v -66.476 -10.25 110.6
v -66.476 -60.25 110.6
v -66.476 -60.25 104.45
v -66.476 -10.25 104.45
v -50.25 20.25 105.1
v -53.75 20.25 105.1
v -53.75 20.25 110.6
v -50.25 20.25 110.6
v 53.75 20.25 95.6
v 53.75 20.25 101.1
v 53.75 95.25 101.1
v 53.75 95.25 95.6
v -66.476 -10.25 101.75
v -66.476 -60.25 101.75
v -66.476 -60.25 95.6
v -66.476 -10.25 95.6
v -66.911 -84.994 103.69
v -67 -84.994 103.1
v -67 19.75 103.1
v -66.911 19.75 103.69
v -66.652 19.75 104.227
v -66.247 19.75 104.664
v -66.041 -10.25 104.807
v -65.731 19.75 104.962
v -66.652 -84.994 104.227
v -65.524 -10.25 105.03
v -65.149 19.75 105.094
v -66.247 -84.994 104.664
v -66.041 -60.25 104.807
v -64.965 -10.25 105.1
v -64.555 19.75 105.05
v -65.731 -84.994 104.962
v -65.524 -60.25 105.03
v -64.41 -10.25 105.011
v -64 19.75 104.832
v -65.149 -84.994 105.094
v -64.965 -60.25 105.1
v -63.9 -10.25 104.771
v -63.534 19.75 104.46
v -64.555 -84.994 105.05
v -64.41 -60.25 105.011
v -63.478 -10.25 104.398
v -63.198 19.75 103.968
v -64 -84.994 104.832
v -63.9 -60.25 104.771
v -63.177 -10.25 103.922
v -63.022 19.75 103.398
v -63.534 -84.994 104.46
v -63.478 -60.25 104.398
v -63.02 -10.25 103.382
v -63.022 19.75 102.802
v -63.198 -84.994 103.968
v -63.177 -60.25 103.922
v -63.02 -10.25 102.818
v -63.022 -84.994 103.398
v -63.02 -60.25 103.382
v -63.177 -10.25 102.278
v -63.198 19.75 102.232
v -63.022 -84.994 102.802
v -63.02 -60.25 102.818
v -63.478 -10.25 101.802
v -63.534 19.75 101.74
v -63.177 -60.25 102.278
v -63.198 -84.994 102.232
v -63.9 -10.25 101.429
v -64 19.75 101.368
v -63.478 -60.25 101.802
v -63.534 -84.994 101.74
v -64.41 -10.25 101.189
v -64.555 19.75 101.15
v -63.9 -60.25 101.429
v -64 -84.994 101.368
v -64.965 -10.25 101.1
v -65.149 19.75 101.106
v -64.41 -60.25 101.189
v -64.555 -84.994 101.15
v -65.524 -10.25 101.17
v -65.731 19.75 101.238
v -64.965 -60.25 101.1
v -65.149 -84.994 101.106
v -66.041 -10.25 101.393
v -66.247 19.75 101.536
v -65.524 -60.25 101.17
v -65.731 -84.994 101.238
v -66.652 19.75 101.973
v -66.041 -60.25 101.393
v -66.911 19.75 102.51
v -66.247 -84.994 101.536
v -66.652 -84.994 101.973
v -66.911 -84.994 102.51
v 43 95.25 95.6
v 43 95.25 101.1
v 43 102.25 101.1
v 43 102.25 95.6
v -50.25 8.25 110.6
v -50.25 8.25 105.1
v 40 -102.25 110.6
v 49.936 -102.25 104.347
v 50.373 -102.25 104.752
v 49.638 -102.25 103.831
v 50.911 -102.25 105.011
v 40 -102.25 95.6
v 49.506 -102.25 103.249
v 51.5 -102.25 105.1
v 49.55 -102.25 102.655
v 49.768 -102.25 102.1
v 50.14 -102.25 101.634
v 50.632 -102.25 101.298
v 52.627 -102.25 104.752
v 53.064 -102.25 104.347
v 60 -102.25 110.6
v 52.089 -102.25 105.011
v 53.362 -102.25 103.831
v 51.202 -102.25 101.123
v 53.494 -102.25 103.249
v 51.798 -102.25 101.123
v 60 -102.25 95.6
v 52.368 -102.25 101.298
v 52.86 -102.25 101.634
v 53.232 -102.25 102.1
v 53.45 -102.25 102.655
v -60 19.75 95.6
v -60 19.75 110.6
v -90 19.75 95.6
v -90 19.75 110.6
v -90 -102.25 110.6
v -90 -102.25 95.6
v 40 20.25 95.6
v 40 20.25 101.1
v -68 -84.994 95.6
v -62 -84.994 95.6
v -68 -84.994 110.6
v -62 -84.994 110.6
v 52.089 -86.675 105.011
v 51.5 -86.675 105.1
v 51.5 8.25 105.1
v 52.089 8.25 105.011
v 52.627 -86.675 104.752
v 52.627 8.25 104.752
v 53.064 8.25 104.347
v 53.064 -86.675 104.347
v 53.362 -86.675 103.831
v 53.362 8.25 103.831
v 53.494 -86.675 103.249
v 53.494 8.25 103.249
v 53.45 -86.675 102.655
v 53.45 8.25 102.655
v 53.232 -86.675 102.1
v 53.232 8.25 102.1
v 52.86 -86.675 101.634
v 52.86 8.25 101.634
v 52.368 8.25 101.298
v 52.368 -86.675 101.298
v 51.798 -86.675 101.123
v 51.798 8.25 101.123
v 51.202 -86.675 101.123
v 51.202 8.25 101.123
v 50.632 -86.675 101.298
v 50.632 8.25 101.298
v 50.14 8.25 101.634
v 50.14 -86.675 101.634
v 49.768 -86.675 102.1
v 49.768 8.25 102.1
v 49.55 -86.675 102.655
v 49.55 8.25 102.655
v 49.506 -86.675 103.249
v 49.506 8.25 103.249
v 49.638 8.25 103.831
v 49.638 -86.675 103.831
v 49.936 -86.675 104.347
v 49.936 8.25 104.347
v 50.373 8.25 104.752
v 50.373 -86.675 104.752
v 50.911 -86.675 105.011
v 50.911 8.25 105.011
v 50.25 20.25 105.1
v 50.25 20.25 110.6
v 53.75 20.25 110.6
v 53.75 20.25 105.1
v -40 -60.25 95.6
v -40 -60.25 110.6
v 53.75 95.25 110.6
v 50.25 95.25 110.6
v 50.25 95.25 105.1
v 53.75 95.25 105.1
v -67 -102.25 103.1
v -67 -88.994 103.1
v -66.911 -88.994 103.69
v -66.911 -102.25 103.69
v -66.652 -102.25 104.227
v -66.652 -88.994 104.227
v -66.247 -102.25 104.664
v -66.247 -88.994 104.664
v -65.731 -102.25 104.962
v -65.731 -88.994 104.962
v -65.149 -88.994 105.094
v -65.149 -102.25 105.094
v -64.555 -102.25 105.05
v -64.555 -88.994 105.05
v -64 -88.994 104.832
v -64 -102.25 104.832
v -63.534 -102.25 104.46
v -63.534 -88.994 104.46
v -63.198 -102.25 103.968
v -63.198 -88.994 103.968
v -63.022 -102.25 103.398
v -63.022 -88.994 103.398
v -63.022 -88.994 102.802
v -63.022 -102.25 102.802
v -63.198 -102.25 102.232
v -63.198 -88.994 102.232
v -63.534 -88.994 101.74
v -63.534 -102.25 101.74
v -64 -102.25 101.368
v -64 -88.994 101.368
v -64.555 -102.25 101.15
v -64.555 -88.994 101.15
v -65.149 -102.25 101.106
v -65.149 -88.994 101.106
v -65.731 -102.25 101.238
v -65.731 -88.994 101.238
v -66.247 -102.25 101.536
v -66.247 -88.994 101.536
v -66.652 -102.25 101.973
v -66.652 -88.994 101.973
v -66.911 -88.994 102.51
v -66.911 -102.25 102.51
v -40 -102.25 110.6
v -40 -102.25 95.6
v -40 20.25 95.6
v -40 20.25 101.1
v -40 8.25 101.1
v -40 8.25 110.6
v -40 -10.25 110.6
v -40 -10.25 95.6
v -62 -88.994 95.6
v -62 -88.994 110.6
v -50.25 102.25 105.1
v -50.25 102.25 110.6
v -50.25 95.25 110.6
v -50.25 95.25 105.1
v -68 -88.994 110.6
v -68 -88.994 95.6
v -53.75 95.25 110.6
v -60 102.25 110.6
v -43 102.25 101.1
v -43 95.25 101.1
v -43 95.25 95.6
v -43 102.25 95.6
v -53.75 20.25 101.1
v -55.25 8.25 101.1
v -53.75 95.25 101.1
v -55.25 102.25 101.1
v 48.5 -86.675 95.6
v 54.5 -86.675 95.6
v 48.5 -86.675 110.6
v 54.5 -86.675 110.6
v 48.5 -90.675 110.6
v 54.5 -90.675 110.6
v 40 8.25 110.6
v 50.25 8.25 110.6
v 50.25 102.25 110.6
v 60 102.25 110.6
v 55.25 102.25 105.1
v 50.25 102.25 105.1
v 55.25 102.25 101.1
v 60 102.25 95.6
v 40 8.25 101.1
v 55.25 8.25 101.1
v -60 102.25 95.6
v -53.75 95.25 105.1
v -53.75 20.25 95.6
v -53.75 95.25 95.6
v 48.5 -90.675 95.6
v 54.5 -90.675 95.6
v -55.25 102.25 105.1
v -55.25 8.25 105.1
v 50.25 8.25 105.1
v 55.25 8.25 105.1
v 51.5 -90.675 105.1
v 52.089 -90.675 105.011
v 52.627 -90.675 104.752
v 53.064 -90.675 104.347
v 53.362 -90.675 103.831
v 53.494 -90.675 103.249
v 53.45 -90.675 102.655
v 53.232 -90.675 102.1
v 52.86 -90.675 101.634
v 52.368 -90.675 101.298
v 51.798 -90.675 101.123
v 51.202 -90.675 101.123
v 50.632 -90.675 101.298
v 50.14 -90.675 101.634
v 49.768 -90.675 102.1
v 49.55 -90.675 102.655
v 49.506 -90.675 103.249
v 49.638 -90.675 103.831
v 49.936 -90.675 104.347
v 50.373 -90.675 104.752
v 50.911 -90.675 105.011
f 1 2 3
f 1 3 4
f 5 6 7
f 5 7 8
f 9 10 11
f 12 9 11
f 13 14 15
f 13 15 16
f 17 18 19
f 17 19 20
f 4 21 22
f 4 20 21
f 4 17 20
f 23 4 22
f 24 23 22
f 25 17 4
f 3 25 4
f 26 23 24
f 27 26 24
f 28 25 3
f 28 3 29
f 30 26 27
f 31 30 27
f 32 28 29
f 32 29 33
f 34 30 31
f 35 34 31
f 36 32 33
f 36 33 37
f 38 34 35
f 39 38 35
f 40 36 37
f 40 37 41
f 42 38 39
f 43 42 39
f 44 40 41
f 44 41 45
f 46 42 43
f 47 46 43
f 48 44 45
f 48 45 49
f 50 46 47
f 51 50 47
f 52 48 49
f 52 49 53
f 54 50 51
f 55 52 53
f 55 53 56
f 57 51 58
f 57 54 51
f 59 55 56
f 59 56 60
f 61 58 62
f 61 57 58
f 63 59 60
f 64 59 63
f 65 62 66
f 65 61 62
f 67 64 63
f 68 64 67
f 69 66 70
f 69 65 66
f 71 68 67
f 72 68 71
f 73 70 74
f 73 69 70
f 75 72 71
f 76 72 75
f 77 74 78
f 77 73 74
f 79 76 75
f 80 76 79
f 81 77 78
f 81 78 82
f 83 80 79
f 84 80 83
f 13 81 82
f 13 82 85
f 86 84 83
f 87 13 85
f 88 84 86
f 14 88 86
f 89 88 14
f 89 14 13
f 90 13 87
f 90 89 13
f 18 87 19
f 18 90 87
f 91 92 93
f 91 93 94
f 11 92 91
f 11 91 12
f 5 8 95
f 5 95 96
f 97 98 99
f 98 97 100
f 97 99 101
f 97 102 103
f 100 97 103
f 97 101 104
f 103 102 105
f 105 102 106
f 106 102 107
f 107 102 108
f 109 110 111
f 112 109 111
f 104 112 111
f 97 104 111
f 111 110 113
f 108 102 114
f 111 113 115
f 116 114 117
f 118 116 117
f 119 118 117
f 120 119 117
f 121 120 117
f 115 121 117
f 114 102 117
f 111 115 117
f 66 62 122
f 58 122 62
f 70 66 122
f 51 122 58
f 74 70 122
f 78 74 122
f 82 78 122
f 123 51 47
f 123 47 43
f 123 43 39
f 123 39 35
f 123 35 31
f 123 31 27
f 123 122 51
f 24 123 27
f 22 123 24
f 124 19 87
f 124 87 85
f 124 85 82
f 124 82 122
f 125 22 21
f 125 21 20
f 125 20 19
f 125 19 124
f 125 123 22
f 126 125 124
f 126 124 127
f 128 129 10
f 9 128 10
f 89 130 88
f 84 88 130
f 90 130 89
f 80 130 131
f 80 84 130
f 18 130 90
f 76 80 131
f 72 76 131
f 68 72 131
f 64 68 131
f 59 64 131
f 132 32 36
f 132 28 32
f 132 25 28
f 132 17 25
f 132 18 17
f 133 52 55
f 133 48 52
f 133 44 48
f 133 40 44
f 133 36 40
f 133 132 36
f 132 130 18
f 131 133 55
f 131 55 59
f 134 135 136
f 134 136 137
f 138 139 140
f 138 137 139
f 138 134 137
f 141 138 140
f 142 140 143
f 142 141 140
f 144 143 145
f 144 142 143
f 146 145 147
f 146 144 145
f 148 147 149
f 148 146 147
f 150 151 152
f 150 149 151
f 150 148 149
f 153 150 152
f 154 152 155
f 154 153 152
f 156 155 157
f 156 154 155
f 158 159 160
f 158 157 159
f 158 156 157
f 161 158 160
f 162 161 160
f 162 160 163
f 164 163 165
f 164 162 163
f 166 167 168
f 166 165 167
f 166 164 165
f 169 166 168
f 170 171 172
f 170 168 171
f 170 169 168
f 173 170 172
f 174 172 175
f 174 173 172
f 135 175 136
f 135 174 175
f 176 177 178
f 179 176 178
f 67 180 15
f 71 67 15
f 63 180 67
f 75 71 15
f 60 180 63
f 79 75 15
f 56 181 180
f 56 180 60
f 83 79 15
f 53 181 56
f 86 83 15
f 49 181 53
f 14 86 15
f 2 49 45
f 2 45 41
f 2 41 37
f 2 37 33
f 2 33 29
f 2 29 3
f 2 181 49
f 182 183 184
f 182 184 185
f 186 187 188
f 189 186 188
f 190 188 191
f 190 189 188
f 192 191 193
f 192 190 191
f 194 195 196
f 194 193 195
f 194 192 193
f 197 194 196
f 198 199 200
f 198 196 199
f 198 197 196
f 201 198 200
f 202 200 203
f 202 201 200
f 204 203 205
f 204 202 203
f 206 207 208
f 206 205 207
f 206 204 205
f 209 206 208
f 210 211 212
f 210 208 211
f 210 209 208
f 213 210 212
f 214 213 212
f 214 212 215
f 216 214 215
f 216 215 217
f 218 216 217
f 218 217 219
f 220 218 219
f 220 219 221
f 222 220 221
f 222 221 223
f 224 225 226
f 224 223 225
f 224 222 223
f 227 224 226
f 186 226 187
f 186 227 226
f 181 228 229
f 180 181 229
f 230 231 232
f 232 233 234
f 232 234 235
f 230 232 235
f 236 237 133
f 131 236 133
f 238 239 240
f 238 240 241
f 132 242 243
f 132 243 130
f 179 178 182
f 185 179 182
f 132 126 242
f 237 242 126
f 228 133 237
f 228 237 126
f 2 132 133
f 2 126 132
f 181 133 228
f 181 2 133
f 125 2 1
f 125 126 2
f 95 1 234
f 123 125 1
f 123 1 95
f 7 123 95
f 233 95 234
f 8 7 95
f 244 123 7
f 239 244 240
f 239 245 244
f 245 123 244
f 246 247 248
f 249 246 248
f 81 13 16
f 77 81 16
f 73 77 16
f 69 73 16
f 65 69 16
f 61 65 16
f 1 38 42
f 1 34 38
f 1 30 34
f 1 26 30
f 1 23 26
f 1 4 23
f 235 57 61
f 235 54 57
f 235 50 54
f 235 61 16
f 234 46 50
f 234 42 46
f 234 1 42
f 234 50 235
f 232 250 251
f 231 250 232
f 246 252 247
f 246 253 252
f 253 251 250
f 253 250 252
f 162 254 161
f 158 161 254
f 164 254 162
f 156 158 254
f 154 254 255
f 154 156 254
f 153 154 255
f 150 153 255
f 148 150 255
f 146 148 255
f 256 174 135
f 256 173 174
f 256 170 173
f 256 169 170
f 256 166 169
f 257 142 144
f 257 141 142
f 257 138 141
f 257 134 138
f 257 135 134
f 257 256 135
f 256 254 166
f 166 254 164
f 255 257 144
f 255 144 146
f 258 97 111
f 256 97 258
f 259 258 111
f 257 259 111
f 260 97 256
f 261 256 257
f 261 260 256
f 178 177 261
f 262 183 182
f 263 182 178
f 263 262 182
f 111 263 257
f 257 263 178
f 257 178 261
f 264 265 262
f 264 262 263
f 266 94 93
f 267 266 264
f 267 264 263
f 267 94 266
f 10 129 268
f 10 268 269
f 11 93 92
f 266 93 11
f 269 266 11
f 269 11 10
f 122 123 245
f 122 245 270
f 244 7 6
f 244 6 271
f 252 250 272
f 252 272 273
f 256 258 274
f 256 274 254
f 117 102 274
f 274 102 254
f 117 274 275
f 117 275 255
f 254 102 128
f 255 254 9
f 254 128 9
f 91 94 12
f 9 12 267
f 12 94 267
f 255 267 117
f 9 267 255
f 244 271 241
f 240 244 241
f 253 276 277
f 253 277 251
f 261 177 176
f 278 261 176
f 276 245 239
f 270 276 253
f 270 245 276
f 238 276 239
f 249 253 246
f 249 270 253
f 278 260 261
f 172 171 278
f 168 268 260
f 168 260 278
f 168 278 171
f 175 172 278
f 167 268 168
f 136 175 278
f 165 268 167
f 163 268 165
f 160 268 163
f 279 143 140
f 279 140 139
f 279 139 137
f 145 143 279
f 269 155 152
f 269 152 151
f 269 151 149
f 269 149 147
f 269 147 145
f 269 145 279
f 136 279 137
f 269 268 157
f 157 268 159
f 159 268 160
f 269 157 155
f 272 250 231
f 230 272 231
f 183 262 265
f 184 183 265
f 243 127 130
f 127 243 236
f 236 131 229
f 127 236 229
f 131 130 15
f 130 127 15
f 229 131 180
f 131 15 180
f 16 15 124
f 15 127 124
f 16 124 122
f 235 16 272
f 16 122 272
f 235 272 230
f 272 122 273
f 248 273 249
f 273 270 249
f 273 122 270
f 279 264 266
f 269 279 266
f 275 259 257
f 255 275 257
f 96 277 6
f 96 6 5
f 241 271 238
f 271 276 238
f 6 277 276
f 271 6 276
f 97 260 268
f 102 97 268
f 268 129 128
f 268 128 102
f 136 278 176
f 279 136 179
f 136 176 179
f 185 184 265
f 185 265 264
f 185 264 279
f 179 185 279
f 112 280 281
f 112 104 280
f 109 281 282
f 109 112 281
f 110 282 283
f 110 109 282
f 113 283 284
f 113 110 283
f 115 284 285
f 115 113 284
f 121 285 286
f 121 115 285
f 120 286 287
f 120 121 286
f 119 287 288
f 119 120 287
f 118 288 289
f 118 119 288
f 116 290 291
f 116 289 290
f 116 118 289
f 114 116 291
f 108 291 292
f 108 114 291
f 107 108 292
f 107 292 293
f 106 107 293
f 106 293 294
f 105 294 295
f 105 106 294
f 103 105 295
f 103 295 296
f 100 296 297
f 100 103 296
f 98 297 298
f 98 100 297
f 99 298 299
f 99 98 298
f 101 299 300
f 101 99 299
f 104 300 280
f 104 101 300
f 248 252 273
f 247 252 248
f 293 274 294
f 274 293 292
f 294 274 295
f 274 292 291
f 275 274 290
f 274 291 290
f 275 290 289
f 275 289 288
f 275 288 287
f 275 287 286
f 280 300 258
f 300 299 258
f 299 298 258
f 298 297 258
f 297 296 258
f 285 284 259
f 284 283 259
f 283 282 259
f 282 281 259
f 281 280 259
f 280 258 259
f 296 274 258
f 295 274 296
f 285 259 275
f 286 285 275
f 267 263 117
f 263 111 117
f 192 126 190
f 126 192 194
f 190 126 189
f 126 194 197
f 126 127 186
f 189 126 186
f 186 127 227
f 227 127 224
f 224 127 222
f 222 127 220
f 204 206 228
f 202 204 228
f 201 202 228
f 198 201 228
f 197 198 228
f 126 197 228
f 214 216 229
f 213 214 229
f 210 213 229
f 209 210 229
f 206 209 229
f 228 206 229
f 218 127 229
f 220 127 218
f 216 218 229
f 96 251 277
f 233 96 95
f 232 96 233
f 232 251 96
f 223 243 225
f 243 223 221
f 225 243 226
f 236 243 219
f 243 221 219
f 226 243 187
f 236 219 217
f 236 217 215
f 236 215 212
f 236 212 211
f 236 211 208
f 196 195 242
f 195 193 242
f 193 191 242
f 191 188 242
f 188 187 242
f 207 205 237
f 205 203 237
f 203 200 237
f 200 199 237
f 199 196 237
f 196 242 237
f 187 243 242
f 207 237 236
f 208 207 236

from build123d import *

# Parameters (mm, degrees)
CROQUIS1_W                  = 220
CROQUIS1_H                  = 204.5
SALIENTE_EXTRUIR1_DEPTH     = 7
CROQUIS2_R                  = 11
CROQUIS2_R_2                = 10
CROQUIS2_R_3                = 14
CORTAR_EXTRUIR1_DEPTH       = 151.346474851
CROQUIS3_W                  = 6
CROQUIS3_H                  = 12
CORTAR_EXTRUIR2_DEPTH       = 10
CROQUIS4_W                  = 220
CROQUIS4_H                  = 7
SALIENTE_EXTRUIR2_DEPTH     = 150.6
CROQUIS5_W                  = 220
CROQUIS5_H                  = 7
SALIENTE_EXTRUIR3_DEPTH     = 197.5
CROQUIS6_W                  = 6
CROQUIS6_H                  = 12
CORTAR_EXTRUIR3_DEPTH       = 150.6
CROQUIS7_R                  = 2.5
CORTAR_EXTRUIR4_DEPTH       = 10
CROQUIS8_W                  = 20
CROQUIS8_H                  = 15
SALIENTE_EXTRUIR4_DEPTH     = 197.5
CROQUIS9_W                  = 110.5
CROQUIS9_H                  = 4
CORTAR_EXTRUIR5_DEPTH       = 94
CROQUIS11_R                 = 2.5
CORTAR_EXTRUIR6_DEPTH       = 10
CORTAR_EXTRUIR7_REACH       = 188.514
CROQUIS10_W                 = 13.75
CROQUIS10_H                 = 75
CORTAR_EXTRUIR8_REACH       = 282.639
CROQUIS12_W                 = 10.25034787
CROQUIS12_H                 = 5.500172095
CROQUIS12_W_2               = 10.24965213
CROQUIS13_W                 = 3
CROQUIS13_H                 = 5.499827905
CORTAR_EXTRUIR9_DEPTH       = 7
CORTAR_EXTRUIR10_DEPTH      = 15
SALIENTE_EXTRUIR5_DEPTH     = 15
CORTAR_EXTRUIR13_DEPTH      = 276.579407794
CORTAR_EXTRUIR13_DEPTH_BACK = 276.579407794
CROQUIS19_R                 = 2
CROQUIS19_R_2               = 1.999827905
CROQUIS20_W                 = 220
CROQUIS20_H                 = 95.6
CROQUIS20_H_2               = 47
CORTAR_EXTRUIR14_DEPTH      = 281.638575395
CROQUIS21_W                 = 20
CROQUIS21_H                 = 15
CROQUIS21_W_2               = 80
CROQUIS21_W_3               = 50
CORTAR_EXTRUIR15_DEPTH      = 252.671631298
CROQUIS22_W                 = 6
CROQUIS22_H                 = 4
CORTAR_EXTRUIR16_DEPTH      = 138.04036814


with BuildPart() as part:
    # Croquis1 → Saliente-Extruir1 (new body)
    with BuildSketch(Plane.XY):
        Rectangle(CROQUIS1_W, CROQUIS1_H)
    extrude(amount=SALIENTE_EXTRUIR1_DEPTH)

    # Croquis2 → Cortar-Extruir1 (cut, through all)
    with BuildSketch(Plane.XY.offset(7)):
        with Locations((-90, 62.25)):
            Circle(CROQUIS2_R)
        with Locations(Location((90, 62.25, 0), (0, 0, 180))):
            Circle(CROQUIS2_R)
        with Locations((0, 62.25)):
            Circle(CROQUIS2_R_2)
        with Locations((90, 3.25)):
            Circle(CROQUIS2_R)
        with Locations(Location((0, 3.25, 0), (0, 0, 180))):
            Circle(CROQUIS2_R_2)
        with Locations(Location((-90, 3.25, 0), (0, 0, 180))):
            Circle(CROQUIS2_R)
        with Locations((-45, -32.25)):
            Circle(CROQUIS2_R_3)
        with Locations((-45, -72.25)):
            Circle(CROQUIS2_R_3)
        with Locations((45, -59.625285127)):
            Circle(CROQUIS2_R)
    extrude(amount=-CORTAR_EXTRUIR1_DEPTH, mode=Mode.SUBTRACT)

    # Croquis3 → Cortar-Extruir2 (cut)
    with BuildSketch(Plane.XY.offset(7)):
        with Locations((-107, 96.25)):
            Rectangle(CROQUIS3_W, CROQUIS3_H)
    extrude(amount=-CORTAR_EXTRUIR2_DEPTH, mode=Mode.SUBTRACT)

    # Croquis4 → Saliente-Extruir2 (add)
    with BuildSketch(Plane.XY.offset(7)):
        with Locations((0, -98.75)):
            Rectangle(CROQUIS4_W, CROQUIS4_H)
    extrude(amount=SALIENTE_EXTRUIR2_DEPTH)

    # Croquis5 → Saliente-Extruir3 (add)
    with BuildSketch(Plane(origin=(0, -95.25, 0), x_dir=(1, 0, 0), z_dir=(0, 1, 0))):
        with Locations((0, -154.1)):
            Rectangle(CROQUIS5_W, CROQUIS5_H)
    extrude(amount=SALIENTE_EXTRUIR3_DEPTH)

    # Croquis6 → Cortar-Extruir3 (cut)
    with BuildSketch(Plane(origin=(0, 0, 150.6), x_dir=(-1, 0, 0), z_dir=(0, 0, -1))):
        with Locations((107, 96.25)):
            Rectangle(CROQUIS6_W, CROQUIS6_H)
    extrude(amount=-CORTAR_EXTRUIR3_DEPTH, mode=Mode.SUBTRACT)

    # Croquis7 → Cortar-Extruir4 (cut)
    with BuildSketch(Plane.XY.offset(157.6)):
        with Locations((-90, 72.25)):
            Circle(CROQUIS7_R)
        with Locations((-17, 72.25)):
            Circle(CROQUIS7_R)
        with Locations((-53.5, 72.25)):
            Circle(CROQUIS7_R)
        with Locations((96, 72.25)):
            Circle(CROQUIS7_R)
        with Locations((59.5, 72.25)):
            Circle(CROQUIS7_R)
        with Locations((23, 72.25)):
            Circle(CROQUIS7_R)
        with Locations((96, 42.25)):
            Circle(CROQUIS7_R)
        with Locations((59.5, 42.25)):
            Circle(CROQUIS7_R)
        with Locations((23, 42.25)):
            Circle(CROQUIS7_R)
        with Locations((-17, 42.25)):
            Circle(CROQUIS7_R)
        with Locations((-53.5, 42.25)):
            Circle(CROQUIS7_R)
        with Locations((-90, 42.25)):
            Circle(CROQUIS7_R)
        with Locations((96, 12.25)):
            Circle(CROQUIS7_R)
        with Locations((59.5, 12.25)):
            Circle(CROQUIS7_R)
        with Locations((23, 12.25)):
            Circle(CROQUIS7_R)
        with Locations((-17, 12.25)):
            Circle(CROQUIS7_R)
        with Locations((-53.5, 12.25)):
            Circle(CROQUIS7_R)
        with Locations((-90, 12.25)):
            Circle(CROQUIS7_R)
    extrude(amount=-CORTAR_EXTRUIR4_DEPTH, mode=Mode.SUBTRACT)

    # Croquis8 → Saliente-Extruir4 (add)
    with BuildSketch(Plane(origin=(0, -95.25, 0), x_dir=(1, 0, 0), z_dir=(0, 1, 0))):
        with Locations((-50, -103.1)):
            Rectangle(CROQUIS8_W, CROQUIS8_H)
        with Locations((50, -103.1)):
            Rectangle(CROQUIS8_W, CROQUIS8_H)
    extrude(amount=SALIENTE_EXTRUIR4_DEPTH)

    # Croquis9 → Cortar-Extruir5 (cut)
    with BuildSketch(Plane(origin=(0, 102.25, 0), x_dir=(1, 0, 0), z_dir=(0, 1, 0))):
        with Locations((-0.00034787, -103.099827905)):
            Rectangle(CROQUIS9_W, CROQUIS9_H)
    extrude(amount=-CORTAR_EXTRUIR5_DEPTH, mode=Mode.SUBTRACT)

    # Croquis11 → Cortar-Extruir6 (cut)
    with BuildSketch(Plane.XY.offset(157.6)):
        with Locations((-10, -77.25)):
            Circle(CROQUIS11_R)
        with Locations((10, -77.25)):
            Circle(CROQUIS11_R)
        with Locations((-63.5, -37.25)):
            Circle(CROQUIS11_R)
        with Locations((-43.5, -37.25)):
            Circle(CROQUIS11_R)
        with Locations((43.5, -37.25)):
            Circle(CROQUIS11_R)
        with Locations((63.5, -37.25)):
            Circle(CROQUIS11_R)
    extrude(amount=-CORTAR_EXTRUIR6_DEPTH, mode=Mode.SUBTRACT)

    # Cortar-Extruir7: up to this face of the body (flat: up to its plane)
    cortar_extruir7_end = Plane(part.part.faces().sort_by_distance((-50, 3.5, 95.6))[0])
    # Croquis10 → Cortar-Extruir7 (cut, up to the picked face)
    with BuildSketch(Plane.XY.offset(110.6), mode=Mode.PRIVATE) as cortar_extruir7_sk1:
        with Locations((-46.875, 57.75)):
            Rectangle(CROQUIS10_W, CROQUIS10_H)
    cortar_extruir7_tool1 = split(extrude(cortar_extruir7_sk1.sketch, amount=-CORTAR_EXTRUIR7_REACH, mode=Mode.PRIVATE), bisect_by=cortar_extruir7_end, keep=Keep.BOTH, mode=Mode.PRIVATE)
    # Croquis10 → Cortar-Extruir7 (cut, up to the picked face)
    with BuildSketch(Plane.XY.offset(110.6), mode=Mode.PRIVATE) as cortar_extruir7_sk2:
        with Locations((46.875, 57.75)):
            Rectangle(CROQUIS10_W, CROQUIS10_H)
    cortar_extruir7_tool2 = split(extrude(cortar_extruir7_sk2.sketch, amount=-CORTAR_EXTRUIR7_REACH, mode=Mode.PRIVATE), bisect_by=cortar_extruir7_end, keep=Keep.BOTH, mode=Mode.PRIVATE)
    add(cortar_extruir7_tool1.solids().sort_by(Axis((-46.875, 57.75, 110.6), (0, 0, -1)))[0], mode=Mode.SUBTRACT)
    add(cortar_extruir7_tool2.solids().sort_by(Axis((46.875, 57.75, 110.6), (0, 0, -1)))[0], mode=Mode.SUBTRACT)

    # Cortar-Extruir8: up to this face of the body (flat: up to its plane)
    cortar_extruir8_end = Plane(part.part.faces().sort_by_distance((-47.625173935, 8.25, 103.099827905))[0])
    # Croquis12 → Cortar-Extruir8 (cut, up to the picked face)
    with BuildSketch(Plane(origin=(0, 102.25, 0), x_dir=(1, 0, 0), z_dir=(0, 1, 0)), mode=Mode.PRIVATE) as cortar_extruir8_sk1:
        with Locations((-45.125173935, -107.849913953)):
            Rectangle(CROQUIS12_W, CROQUIS12_H)
    cortar_extruir8_tool1 = split(extrude(cortar_extruir8_sk1.sketch, amount=-CORTAR_EXTRUIR8_REACH, mode=Mode.PRIVATE), bisect_by=cortar_extruir8_end, keep=Keep.BOTH, mode=Mode.PRIVATE)
    # Croquis12 → Cortar-Extruir8 (cut, up to the picked face)
    with BuildSketch(Plane(origin=(0, 102.25, 0), x_dir=(1, 0, 0), z_dir=(0, 1, 0)), mode=Mode.PRIVATE) as cortar_extruir8_sk2:
        with Locations((45.124826065, -107.849913953)):
            Rectangle(CROQUIS12_W_2, CROQUIS12_H)
    cortar_extruir8_tool2 = split(extrude(cortar_extruir8_sk2.sketch, amount=-CORTAR_EXTRUIR8_REACH, mode=Mode.PRIVATE), bisect_by=cortar_extruir8_end, keep=Keep.BOTH, mode=Mode.PRIVATE)
    add(cortar_extruir8_tool1.solids().sort_by(Axis((-45.125174, 102.25, 107.849914), (0, -1, 0)))[0], mode=Mode.SUBTRACT)
    add(cortar_extruir8_tool2.solids().sort_by(Axis((45.124826, 102.25, 107.849914), (0, -1, 0)))[0], mode=Mode.SUBTRACT)

    # Croquis13 → Cortar-Extruir9 (cut)
    with BuildSketch(Plane(origin=(0, 102.25, 0), x_dir=(1, 0, 0), z_dir=(0, 1, 0))):
        with Locations((-41.5, -98.349913953)):
            Rectangle(CROQUIS13_W, CROQUIS13_H)
        with Locations((41.5, -98.349913953)):
            Rectangle(CROQUIS13_W, CROQUIS13_H)
    extrude(amount=-CORTAR_EXTRUIR9_DEPTH, mode=Mode.SUBTRACT)

    # Croquis14 → Cortar-Extruir10 (cut)
    with BuildSketch(Plane.XY.offset(110.6)):
        Polygon((-40, -10.25), (-51.479605867, -10.25), (-60, -10.25), (-60, -60.25), (-40, -60.25), align=None)
    extrude(amount=-CORTAR_EXTRUIR10_DEPTH, mode=Mode.SUBTRACT)


with BuildPart() as cortar_extruir10_piece_1:
    # of the separate pieces the step leaves, piece 1, a body of its own (cortar_extruir10_pieces)
    add(part.part.solids().sort_by_distance((-104, 102.25, 0))[0])



with BuildPart() as cortar_extruir10_piece_2:
    # of the separate pieces the step leaves, piece 2, a body of its own (cortar_extruir10_pieces)
    add(part.part.solids().sort_by_distance((-40, -10.25, 95.6))[0])


with BuildPart() as cortar_extruir10_piece_1_1:
    add(cortar_extruir10_piece_1.part)

    add(cortar_extruir10_piece_2.part)  # Saliente-Extruir5 merges Cortar-Extruir10 piece 2
    # Croquis15 → Saliente-Extruir5 (add)
    with BuildSketch(Plane.XY.offset(110.6)):
        Polygon((-60, 19.75), (-90, 19.75), (-90, -95.25), (-60, -95.25), (-60, -60.25), (-66.476045764, -60.25), (-66.476045764, -10.25), (-60, -10.25), align=None)
    extrude(amount=-SALIENTE_EXTRUIR5_DEPTH)

    # Croquis19 → Cortar-Extruir13 (cut, two sides: drawn at the far end of the back side and taken through both)
    with BuildSketch(Plane(origin=(0, -95.25, 0), x_dir=(1, 0, 0), z_dir=(0, 1, 0)).offset(-CORTAR_EXTRUIR13_DEPTH_BACK)):
        with Locations(Location((-65, -103.1, 0), (0, 0, 180))):
            Circle(CROQUIS19_R)
        with Locations(Location((51.5, -103.1, 0), (0, 0, 270))):
            Circle(CROQUIS19_R_2)
    extrude(amount=CORTAR_EXTRUIR13_DEPTH + CORTAR_EXTRUIR13_DEPTH_BACK, mode=Mode.SUBTRACT)

    # Croquis20 → Cortar-Extruir14 (cut, through all)
    with BuildSketch(Plane(origin=(0, 102.25, 0), x_dir=(1, 0, 0), z_dir=(0, 1, 0))):
        with Locations((0, -47.8)):
            Rectangle(CROQUIS20_W, CROQUIS20_H)
        with Locations((0, -134.1)):
            Rectangle(CROQUIS20_W, CROQUIS20_H_2)
    extrude(amount=-CORTAR_EXTRUIR14_DEPTH, mode=Mode.SUBTRACT)

    # Croquis21 → Cortar-Extruir15 (cut, through all)
    with BuildSketch(Plane(origin=(0, -95.25, 0), x_dir=(1, 0, 0), z_dir=(0, 1, 0))):
        with Locations((-100, -103.1)):
            Rectangle(CROQUIS21_W, CROQUIS21_H)
        with Locations((0, -103.1)):
            Rectangle(CROQUIS21_W_2, CROQUIS21_H)
        with Locations((85, -103.1)):
            Rectangle(CROQUIS21_W_3, CROQUIS21_H)
    extrude(amount=-CORTAR_EXTRUIR15_DEPTH, mode=Mode.SUBTRACT)


with BuildPart() as cortar_extruir15_piece_1:
    # of the separate pieces the step leaves, piece 1, a body of its own (cortar_extruir15_pieces)
    add(cortar_extruir10_piece_1_1.part.solids().sort_by_distance((-40, -10.25, 95.6))[0])


with BuildPart() as cortar_extruir15_piece_2:
    # of the separate pieces the step leaves, piece 2, a body of its own (cortar_extruir15_pieces)
    add(cortar_extruir10_piece_1_1.part.solids().sort_by_distance((40, -102.25, 95.6))[0])


with BuildPart() as cortar_extruir16_tool:
    # Croquis22 → Cortar-Extruir16 (new, through all)
    with BuildSketch(Plane.XY.offset(110.6)):
        with Locations((-65, -86.99392464)):
            Rectangle(CROQUIS22_W, CROQUIS22_H)
        with Locations((51.500172095, -88.675276493)):
            Rectangle(CROQUIS22_W, CROQUIS22_H)
    extrude(amount=-CORTAR_EXTRUIR16_DEPTH)


with BuildPart() as cortar_extruir15_piece_1_1:
    add(cortar_extruir15_piece_1.part)

    # Cortar-Extruir16: cut by cortar_extruir16_tool
    add(cortar_extruir16_tool.part, mode=Mode.SUBTRACT)


with BuildPart() as cortar_extruir15_piece_2_1:
    add(cortar_extruir15_piece_2.part)

    # Cortar-Extruir16: cut by cortar_extruir16_tool
    add(cortar_extruir16_tool.part, mode=Mode.SUBTRACT)


solid = Compound([cortar_extruir15_piece_1_1.part, cortar_extruir15_piece_2_1.part])
